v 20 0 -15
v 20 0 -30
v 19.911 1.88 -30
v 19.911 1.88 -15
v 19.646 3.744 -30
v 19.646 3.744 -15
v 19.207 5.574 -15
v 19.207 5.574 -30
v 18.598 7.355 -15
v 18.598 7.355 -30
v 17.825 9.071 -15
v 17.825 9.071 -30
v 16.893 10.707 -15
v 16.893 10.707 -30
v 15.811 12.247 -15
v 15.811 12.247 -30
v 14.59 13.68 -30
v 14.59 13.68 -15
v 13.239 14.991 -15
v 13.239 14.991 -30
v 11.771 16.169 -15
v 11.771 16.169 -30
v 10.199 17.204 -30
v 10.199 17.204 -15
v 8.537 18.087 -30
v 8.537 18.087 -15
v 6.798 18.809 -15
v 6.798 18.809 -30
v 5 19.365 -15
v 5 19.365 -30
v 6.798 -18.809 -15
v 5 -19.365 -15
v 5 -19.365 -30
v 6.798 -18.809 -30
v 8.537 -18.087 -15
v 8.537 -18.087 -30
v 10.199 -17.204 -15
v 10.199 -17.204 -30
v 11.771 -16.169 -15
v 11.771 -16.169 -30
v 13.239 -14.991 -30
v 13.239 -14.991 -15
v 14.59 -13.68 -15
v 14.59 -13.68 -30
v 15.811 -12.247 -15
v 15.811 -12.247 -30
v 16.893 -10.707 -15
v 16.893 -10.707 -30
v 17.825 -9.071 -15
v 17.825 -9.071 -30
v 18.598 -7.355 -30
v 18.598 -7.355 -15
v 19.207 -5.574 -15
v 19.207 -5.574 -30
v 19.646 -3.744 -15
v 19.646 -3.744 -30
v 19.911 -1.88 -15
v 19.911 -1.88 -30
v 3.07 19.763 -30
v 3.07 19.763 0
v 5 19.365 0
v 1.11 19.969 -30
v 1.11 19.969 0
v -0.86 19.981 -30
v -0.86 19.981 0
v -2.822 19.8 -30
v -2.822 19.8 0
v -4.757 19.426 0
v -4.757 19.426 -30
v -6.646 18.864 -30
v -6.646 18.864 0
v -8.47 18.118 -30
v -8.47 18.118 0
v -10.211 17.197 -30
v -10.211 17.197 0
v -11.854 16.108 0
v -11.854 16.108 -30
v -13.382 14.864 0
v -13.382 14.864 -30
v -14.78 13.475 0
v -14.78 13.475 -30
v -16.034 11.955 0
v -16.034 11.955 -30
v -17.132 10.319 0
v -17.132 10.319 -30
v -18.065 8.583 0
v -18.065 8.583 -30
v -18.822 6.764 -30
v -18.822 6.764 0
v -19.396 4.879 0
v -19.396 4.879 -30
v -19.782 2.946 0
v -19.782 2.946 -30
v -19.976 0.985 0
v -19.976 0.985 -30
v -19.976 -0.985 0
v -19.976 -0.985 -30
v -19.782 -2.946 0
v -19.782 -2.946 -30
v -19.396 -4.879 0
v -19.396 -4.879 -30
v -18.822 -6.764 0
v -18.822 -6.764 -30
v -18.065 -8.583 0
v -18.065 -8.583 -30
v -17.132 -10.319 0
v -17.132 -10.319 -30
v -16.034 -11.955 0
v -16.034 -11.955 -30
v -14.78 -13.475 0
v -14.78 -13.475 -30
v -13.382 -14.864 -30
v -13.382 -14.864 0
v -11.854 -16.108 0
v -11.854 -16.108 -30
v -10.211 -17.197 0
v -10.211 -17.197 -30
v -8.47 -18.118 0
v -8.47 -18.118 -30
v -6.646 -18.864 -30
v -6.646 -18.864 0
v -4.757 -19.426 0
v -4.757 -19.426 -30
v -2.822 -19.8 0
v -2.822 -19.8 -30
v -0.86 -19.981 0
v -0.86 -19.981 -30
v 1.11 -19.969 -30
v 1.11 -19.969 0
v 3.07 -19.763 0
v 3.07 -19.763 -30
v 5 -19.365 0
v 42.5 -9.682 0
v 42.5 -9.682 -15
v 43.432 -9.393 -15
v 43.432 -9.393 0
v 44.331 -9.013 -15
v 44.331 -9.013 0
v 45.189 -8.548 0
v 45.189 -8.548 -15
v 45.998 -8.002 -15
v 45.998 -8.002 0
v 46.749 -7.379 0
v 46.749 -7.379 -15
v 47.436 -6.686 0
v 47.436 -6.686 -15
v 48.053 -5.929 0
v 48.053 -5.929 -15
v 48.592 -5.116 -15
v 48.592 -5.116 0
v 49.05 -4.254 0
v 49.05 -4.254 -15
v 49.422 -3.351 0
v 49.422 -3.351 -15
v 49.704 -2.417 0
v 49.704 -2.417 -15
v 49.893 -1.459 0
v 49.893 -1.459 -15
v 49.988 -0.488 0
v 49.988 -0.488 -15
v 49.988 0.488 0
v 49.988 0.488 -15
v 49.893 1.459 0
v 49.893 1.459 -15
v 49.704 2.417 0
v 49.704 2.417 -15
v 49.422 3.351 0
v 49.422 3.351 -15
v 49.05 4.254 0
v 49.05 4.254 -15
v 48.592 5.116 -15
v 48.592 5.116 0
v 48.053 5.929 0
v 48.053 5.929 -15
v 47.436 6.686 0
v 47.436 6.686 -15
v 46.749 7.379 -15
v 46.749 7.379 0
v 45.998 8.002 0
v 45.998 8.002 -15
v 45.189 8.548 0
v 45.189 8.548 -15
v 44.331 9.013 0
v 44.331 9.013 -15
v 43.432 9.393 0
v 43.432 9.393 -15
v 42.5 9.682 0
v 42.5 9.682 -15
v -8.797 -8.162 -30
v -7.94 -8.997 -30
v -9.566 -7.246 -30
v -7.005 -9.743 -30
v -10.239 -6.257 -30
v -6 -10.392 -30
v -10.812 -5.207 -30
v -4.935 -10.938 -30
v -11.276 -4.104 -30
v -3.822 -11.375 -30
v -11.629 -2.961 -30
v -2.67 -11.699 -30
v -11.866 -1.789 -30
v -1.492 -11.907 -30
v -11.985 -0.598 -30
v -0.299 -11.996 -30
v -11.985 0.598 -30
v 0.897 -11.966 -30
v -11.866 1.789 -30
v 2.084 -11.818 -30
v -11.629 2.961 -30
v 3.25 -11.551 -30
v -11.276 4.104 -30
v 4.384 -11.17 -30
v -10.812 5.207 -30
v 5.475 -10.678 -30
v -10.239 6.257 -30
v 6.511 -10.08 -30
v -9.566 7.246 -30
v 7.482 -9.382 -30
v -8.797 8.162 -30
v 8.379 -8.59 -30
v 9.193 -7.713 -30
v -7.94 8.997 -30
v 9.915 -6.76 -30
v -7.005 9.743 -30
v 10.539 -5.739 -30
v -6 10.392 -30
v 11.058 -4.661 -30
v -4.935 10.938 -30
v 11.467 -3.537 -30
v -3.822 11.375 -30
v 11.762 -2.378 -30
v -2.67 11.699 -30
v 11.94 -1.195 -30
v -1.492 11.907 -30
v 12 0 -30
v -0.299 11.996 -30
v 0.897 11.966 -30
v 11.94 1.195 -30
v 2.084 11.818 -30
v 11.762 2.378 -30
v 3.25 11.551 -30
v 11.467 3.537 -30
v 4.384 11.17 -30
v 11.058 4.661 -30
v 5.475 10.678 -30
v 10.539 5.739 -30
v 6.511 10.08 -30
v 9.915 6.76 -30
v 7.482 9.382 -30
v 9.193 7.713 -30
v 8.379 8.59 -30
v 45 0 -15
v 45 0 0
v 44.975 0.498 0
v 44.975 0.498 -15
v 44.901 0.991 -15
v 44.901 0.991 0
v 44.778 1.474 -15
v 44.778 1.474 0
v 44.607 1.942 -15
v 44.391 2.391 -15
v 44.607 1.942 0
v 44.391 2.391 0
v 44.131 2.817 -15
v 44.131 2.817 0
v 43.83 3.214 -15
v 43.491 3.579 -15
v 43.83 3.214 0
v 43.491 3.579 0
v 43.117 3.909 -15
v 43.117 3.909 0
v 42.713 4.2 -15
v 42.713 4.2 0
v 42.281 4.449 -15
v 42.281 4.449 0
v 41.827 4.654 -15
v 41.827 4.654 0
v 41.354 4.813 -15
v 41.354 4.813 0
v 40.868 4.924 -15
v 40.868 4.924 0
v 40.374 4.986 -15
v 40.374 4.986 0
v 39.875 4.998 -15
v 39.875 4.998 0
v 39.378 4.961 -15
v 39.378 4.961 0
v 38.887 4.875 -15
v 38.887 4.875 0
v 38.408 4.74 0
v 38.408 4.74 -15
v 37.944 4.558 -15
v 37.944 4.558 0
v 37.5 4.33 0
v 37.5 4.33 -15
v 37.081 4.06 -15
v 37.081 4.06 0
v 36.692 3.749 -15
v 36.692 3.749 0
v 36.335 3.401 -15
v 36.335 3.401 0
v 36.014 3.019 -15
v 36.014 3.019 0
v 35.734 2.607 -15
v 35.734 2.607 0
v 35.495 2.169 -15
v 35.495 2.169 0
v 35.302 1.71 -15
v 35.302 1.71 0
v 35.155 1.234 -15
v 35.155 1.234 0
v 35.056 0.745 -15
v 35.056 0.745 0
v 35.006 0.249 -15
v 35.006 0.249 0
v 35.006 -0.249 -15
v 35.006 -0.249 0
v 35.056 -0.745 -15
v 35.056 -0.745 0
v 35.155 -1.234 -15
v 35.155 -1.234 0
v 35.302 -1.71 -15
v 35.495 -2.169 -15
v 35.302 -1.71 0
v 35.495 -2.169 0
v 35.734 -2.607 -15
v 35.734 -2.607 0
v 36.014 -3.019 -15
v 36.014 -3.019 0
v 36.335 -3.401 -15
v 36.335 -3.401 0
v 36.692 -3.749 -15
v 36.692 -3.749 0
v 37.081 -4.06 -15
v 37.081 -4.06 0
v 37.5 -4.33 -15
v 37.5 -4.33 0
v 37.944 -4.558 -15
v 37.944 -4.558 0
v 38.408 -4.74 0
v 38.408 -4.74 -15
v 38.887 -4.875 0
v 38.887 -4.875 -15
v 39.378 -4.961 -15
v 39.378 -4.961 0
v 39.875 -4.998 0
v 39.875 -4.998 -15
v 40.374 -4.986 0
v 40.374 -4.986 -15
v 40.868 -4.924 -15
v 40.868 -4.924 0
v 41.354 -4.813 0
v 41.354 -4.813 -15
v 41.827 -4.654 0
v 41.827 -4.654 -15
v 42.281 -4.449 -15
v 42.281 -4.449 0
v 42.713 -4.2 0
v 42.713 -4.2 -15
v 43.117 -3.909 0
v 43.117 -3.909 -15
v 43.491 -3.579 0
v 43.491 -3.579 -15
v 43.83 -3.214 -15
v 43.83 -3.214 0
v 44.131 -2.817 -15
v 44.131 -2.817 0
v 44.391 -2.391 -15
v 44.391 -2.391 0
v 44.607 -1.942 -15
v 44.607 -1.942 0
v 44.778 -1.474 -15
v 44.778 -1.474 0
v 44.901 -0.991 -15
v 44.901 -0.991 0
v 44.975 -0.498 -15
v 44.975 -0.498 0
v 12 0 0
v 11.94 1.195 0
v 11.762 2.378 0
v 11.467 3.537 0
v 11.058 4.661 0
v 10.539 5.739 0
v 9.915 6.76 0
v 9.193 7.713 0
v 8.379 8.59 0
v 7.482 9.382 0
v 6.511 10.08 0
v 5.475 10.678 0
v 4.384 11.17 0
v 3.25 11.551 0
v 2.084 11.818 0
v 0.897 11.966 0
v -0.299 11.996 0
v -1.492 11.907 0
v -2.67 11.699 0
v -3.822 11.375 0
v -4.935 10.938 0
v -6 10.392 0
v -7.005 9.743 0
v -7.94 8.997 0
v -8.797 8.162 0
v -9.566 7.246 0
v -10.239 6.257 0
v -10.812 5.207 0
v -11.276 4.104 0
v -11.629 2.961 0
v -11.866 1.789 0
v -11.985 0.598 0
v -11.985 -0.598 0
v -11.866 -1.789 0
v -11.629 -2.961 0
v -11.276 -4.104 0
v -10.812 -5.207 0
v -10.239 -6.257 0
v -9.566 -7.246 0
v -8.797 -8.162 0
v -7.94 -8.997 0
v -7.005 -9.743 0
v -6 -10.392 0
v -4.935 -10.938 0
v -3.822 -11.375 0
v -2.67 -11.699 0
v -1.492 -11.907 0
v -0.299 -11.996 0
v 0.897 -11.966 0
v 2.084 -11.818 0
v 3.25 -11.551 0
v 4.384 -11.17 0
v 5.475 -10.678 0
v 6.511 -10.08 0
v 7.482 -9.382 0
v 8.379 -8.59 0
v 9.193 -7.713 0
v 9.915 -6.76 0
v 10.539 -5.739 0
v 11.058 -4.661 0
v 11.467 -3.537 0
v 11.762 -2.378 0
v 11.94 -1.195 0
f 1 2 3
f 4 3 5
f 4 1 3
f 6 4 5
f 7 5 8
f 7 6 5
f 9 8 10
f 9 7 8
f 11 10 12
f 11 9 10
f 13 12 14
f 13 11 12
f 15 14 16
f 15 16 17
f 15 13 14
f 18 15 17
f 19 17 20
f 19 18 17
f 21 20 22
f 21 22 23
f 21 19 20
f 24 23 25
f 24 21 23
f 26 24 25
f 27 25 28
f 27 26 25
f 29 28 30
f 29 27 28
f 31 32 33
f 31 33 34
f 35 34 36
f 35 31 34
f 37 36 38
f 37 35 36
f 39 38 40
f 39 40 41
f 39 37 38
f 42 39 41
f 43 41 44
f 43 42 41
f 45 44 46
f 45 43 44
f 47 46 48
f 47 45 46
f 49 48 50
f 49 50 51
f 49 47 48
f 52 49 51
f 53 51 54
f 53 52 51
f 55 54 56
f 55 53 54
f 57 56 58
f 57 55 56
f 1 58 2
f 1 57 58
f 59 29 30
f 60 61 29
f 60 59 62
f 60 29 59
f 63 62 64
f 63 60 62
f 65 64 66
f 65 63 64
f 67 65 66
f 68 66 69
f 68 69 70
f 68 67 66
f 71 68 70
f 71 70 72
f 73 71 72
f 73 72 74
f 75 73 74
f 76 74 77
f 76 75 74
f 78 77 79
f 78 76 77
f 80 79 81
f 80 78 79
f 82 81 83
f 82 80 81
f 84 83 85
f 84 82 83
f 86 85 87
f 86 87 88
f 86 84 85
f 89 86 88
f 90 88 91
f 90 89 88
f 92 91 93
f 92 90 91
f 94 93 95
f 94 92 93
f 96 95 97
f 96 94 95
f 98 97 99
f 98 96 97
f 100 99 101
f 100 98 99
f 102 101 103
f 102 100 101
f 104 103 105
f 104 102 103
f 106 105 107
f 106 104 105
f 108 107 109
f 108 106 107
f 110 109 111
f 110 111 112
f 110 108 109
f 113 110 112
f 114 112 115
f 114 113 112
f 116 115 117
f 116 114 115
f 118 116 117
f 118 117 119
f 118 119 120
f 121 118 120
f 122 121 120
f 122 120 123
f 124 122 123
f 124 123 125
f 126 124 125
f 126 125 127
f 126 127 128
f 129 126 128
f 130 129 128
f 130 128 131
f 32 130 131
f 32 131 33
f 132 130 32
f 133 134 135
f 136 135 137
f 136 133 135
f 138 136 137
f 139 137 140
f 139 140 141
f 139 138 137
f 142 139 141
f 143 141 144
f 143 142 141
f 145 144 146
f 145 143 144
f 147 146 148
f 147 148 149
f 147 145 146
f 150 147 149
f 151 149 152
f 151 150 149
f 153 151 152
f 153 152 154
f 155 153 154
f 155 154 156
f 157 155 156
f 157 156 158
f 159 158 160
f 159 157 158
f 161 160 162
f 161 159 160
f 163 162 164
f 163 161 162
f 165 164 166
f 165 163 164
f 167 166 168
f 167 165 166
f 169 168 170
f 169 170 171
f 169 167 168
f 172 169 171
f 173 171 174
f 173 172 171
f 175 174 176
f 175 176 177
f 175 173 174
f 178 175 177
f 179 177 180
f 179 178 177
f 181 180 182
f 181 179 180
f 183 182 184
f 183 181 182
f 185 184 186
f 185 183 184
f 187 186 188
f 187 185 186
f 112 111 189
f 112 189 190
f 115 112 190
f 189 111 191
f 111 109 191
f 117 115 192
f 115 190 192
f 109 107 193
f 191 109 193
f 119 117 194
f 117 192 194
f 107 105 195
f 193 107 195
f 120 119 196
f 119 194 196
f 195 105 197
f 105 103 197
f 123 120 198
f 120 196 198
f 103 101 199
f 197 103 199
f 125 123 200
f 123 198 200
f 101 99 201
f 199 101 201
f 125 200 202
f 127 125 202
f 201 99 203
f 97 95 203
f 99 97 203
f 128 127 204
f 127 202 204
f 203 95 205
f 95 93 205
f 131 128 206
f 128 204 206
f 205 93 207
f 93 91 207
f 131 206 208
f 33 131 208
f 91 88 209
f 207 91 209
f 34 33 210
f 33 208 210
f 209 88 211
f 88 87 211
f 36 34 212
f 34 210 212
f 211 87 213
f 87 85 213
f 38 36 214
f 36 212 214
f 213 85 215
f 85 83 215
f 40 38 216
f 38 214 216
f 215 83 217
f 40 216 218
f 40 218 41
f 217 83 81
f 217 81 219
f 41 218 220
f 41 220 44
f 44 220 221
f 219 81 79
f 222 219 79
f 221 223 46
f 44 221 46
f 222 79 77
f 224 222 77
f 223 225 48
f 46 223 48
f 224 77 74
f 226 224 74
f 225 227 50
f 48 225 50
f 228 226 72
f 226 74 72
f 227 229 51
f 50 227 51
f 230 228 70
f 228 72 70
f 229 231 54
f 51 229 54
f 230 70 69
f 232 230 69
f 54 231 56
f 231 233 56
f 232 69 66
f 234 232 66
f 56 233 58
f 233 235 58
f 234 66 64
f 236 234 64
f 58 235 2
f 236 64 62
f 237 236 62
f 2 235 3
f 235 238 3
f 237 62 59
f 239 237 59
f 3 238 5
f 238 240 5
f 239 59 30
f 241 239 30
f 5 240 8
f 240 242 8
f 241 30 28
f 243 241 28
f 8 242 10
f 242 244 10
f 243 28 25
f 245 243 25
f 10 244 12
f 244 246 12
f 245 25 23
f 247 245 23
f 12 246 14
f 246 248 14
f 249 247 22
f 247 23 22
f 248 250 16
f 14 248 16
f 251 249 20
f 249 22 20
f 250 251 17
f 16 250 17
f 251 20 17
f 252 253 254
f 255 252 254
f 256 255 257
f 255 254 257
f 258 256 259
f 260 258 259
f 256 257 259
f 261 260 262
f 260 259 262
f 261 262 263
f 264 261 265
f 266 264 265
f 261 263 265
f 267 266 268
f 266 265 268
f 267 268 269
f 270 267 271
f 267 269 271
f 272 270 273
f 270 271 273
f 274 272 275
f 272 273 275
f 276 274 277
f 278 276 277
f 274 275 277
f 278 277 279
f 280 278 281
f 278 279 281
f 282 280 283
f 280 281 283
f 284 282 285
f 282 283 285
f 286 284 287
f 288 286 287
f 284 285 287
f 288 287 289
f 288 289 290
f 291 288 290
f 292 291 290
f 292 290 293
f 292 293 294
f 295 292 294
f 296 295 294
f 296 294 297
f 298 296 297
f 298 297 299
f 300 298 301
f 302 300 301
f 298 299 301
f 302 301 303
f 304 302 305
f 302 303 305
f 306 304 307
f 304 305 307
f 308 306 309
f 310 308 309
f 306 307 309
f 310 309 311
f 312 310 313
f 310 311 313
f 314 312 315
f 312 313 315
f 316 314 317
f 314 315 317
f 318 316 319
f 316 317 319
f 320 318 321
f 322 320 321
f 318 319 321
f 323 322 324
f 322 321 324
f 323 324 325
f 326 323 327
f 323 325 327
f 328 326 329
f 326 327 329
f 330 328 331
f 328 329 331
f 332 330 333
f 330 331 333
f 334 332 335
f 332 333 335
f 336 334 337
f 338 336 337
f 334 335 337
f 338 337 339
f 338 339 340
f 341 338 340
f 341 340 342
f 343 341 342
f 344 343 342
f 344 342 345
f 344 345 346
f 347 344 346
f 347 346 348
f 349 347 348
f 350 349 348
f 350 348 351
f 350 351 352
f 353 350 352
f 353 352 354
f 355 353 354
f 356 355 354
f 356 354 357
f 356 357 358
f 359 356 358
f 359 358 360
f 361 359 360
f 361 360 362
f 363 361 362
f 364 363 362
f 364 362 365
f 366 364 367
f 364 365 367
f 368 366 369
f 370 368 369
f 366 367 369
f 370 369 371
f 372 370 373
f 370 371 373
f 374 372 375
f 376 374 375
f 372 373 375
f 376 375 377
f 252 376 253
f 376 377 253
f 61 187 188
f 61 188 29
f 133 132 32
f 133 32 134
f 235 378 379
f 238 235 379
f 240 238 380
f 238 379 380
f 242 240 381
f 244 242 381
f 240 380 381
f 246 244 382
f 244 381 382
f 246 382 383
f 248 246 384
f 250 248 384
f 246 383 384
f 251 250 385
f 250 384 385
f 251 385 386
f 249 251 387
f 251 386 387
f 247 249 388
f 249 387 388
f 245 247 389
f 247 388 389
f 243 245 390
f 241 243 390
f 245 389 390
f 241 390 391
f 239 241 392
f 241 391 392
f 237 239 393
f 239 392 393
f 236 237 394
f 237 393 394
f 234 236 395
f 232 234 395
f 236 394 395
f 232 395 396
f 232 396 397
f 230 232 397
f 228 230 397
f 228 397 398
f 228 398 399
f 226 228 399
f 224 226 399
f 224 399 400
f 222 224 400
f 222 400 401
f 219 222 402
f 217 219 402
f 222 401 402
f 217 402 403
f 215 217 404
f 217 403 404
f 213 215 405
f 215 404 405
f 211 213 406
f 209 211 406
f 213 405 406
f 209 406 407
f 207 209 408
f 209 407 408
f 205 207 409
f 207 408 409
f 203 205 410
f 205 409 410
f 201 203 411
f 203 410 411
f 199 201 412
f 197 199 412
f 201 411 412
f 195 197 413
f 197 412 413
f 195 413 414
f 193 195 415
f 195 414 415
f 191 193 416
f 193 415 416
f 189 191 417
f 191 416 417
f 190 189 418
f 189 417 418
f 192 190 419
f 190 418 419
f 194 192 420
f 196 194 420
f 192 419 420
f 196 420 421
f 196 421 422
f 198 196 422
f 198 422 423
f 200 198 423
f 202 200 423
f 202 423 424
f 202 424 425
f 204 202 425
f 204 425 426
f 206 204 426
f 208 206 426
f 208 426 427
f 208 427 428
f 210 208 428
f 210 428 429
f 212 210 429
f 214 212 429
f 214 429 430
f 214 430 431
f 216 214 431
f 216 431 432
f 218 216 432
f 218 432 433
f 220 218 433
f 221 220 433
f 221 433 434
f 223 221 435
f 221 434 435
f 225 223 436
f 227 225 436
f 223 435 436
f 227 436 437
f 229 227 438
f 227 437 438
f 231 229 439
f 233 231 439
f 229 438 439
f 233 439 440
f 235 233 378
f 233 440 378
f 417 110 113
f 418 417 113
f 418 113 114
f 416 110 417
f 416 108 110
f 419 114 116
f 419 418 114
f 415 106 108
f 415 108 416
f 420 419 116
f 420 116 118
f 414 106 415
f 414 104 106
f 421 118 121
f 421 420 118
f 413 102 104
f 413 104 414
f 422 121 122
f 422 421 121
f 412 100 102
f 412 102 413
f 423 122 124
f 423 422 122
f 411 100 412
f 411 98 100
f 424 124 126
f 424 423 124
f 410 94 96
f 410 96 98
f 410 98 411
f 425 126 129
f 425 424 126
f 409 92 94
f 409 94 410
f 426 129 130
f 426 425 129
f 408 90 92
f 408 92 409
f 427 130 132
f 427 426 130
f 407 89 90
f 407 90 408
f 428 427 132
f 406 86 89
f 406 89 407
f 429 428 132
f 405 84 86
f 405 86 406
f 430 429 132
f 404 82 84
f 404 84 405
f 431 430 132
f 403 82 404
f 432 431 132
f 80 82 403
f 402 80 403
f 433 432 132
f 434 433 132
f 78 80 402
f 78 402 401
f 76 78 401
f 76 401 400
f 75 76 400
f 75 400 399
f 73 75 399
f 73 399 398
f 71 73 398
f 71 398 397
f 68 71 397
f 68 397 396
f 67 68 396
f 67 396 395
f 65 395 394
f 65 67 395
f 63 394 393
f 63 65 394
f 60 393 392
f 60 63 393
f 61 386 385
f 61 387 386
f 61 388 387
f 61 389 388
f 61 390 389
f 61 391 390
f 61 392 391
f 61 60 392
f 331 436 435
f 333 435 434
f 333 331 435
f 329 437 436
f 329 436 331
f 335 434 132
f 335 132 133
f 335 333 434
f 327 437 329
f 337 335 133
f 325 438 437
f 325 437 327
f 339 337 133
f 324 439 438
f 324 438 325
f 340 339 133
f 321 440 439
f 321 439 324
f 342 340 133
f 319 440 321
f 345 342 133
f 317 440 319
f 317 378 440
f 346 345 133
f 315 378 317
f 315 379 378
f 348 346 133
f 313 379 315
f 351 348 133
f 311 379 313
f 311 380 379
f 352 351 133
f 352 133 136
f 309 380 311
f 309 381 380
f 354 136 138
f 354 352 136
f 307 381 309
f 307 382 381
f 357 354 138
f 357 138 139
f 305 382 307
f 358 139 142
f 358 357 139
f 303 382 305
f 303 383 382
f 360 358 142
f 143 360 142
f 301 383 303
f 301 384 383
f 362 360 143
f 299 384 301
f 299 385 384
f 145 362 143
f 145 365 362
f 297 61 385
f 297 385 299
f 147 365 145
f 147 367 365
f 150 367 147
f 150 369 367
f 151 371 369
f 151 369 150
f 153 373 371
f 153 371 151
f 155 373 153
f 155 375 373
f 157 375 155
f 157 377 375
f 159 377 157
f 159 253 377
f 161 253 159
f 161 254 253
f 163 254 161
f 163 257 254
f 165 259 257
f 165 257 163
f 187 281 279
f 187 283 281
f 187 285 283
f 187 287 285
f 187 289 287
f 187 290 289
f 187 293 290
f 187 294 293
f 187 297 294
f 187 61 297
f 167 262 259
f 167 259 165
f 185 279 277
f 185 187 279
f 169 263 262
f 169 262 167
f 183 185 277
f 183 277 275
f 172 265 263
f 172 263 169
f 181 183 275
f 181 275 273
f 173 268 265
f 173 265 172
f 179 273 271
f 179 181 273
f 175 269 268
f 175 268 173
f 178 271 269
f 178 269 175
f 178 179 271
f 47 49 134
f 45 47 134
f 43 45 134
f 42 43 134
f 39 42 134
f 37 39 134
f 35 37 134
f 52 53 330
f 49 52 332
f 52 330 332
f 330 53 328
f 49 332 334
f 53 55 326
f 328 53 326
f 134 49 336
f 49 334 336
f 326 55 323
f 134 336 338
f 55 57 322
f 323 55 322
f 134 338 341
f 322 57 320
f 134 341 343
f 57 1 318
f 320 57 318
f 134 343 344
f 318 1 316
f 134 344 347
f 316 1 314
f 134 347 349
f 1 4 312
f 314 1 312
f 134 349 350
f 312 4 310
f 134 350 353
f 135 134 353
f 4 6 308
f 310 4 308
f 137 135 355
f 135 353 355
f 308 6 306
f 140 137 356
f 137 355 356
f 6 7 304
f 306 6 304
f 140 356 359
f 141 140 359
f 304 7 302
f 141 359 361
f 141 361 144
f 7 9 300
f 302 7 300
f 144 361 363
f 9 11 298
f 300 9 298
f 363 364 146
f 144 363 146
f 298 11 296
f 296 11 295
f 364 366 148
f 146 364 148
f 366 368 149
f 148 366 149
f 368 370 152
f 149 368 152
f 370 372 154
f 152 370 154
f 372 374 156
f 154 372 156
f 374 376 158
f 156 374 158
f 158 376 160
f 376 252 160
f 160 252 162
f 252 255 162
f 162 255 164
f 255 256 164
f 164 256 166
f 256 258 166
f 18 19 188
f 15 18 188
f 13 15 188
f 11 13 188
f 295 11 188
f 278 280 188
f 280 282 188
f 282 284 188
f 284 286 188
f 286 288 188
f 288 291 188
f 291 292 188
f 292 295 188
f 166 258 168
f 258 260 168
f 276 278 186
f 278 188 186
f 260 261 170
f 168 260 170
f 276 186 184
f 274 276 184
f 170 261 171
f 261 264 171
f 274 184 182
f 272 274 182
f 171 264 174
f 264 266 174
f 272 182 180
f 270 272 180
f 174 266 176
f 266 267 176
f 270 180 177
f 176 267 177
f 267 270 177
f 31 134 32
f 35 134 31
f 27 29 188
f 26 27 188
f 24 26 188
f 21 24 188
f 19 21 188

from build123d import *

# Parameters (mm, degrees)
F0_R     = 5
F1_DEPTH = 15
F0_R_2   = 12
F2_DEPTH = 30


with BuildPart() as f1:
    # F0 (on Top) → F1 (new body)
    with BuildSketch(Plane.XY):
        with BuildLine():
            ThreePointArc((5, 19.364917), (15.811388, 12.247449), (20, 0))
            ThreePointArc((20, 0), (15.811388, -12.247449), (5, -19.364917))
            Line((5, -19.364917), (42.5, -9.682458))
            ThreePointArc((42.5, -9.682458), (50, 0), (42.5, 9.682458))
            Line((42.5, 9.682458), (5, 19.364917))
        make_face()
        with Locations((40, 0)):
            Circle(F0_R, mode=Mode.SUBTRACT)
    extrude(amount=-F1_DEPTH)

    # F0 (on Top) → F2 (join)
    with BuildSketch(Plane.XY):
        with BuildLine():
            ThreePointArc((5, -19.364917), (15.811388, -12.247449), (20, 0))
            ThreePointArc((20, 0), (15.811388, 12.247449), (5, 19.364917))
            ThreePointArc((5, 19.364917), (-20, 0), (5, -19.364917))
        make_face()
        Circle(F0_R_2, mode=Mode.SUBTRACT)
    extrude(amount=-F2_DEPTH)


solid = f1.part
